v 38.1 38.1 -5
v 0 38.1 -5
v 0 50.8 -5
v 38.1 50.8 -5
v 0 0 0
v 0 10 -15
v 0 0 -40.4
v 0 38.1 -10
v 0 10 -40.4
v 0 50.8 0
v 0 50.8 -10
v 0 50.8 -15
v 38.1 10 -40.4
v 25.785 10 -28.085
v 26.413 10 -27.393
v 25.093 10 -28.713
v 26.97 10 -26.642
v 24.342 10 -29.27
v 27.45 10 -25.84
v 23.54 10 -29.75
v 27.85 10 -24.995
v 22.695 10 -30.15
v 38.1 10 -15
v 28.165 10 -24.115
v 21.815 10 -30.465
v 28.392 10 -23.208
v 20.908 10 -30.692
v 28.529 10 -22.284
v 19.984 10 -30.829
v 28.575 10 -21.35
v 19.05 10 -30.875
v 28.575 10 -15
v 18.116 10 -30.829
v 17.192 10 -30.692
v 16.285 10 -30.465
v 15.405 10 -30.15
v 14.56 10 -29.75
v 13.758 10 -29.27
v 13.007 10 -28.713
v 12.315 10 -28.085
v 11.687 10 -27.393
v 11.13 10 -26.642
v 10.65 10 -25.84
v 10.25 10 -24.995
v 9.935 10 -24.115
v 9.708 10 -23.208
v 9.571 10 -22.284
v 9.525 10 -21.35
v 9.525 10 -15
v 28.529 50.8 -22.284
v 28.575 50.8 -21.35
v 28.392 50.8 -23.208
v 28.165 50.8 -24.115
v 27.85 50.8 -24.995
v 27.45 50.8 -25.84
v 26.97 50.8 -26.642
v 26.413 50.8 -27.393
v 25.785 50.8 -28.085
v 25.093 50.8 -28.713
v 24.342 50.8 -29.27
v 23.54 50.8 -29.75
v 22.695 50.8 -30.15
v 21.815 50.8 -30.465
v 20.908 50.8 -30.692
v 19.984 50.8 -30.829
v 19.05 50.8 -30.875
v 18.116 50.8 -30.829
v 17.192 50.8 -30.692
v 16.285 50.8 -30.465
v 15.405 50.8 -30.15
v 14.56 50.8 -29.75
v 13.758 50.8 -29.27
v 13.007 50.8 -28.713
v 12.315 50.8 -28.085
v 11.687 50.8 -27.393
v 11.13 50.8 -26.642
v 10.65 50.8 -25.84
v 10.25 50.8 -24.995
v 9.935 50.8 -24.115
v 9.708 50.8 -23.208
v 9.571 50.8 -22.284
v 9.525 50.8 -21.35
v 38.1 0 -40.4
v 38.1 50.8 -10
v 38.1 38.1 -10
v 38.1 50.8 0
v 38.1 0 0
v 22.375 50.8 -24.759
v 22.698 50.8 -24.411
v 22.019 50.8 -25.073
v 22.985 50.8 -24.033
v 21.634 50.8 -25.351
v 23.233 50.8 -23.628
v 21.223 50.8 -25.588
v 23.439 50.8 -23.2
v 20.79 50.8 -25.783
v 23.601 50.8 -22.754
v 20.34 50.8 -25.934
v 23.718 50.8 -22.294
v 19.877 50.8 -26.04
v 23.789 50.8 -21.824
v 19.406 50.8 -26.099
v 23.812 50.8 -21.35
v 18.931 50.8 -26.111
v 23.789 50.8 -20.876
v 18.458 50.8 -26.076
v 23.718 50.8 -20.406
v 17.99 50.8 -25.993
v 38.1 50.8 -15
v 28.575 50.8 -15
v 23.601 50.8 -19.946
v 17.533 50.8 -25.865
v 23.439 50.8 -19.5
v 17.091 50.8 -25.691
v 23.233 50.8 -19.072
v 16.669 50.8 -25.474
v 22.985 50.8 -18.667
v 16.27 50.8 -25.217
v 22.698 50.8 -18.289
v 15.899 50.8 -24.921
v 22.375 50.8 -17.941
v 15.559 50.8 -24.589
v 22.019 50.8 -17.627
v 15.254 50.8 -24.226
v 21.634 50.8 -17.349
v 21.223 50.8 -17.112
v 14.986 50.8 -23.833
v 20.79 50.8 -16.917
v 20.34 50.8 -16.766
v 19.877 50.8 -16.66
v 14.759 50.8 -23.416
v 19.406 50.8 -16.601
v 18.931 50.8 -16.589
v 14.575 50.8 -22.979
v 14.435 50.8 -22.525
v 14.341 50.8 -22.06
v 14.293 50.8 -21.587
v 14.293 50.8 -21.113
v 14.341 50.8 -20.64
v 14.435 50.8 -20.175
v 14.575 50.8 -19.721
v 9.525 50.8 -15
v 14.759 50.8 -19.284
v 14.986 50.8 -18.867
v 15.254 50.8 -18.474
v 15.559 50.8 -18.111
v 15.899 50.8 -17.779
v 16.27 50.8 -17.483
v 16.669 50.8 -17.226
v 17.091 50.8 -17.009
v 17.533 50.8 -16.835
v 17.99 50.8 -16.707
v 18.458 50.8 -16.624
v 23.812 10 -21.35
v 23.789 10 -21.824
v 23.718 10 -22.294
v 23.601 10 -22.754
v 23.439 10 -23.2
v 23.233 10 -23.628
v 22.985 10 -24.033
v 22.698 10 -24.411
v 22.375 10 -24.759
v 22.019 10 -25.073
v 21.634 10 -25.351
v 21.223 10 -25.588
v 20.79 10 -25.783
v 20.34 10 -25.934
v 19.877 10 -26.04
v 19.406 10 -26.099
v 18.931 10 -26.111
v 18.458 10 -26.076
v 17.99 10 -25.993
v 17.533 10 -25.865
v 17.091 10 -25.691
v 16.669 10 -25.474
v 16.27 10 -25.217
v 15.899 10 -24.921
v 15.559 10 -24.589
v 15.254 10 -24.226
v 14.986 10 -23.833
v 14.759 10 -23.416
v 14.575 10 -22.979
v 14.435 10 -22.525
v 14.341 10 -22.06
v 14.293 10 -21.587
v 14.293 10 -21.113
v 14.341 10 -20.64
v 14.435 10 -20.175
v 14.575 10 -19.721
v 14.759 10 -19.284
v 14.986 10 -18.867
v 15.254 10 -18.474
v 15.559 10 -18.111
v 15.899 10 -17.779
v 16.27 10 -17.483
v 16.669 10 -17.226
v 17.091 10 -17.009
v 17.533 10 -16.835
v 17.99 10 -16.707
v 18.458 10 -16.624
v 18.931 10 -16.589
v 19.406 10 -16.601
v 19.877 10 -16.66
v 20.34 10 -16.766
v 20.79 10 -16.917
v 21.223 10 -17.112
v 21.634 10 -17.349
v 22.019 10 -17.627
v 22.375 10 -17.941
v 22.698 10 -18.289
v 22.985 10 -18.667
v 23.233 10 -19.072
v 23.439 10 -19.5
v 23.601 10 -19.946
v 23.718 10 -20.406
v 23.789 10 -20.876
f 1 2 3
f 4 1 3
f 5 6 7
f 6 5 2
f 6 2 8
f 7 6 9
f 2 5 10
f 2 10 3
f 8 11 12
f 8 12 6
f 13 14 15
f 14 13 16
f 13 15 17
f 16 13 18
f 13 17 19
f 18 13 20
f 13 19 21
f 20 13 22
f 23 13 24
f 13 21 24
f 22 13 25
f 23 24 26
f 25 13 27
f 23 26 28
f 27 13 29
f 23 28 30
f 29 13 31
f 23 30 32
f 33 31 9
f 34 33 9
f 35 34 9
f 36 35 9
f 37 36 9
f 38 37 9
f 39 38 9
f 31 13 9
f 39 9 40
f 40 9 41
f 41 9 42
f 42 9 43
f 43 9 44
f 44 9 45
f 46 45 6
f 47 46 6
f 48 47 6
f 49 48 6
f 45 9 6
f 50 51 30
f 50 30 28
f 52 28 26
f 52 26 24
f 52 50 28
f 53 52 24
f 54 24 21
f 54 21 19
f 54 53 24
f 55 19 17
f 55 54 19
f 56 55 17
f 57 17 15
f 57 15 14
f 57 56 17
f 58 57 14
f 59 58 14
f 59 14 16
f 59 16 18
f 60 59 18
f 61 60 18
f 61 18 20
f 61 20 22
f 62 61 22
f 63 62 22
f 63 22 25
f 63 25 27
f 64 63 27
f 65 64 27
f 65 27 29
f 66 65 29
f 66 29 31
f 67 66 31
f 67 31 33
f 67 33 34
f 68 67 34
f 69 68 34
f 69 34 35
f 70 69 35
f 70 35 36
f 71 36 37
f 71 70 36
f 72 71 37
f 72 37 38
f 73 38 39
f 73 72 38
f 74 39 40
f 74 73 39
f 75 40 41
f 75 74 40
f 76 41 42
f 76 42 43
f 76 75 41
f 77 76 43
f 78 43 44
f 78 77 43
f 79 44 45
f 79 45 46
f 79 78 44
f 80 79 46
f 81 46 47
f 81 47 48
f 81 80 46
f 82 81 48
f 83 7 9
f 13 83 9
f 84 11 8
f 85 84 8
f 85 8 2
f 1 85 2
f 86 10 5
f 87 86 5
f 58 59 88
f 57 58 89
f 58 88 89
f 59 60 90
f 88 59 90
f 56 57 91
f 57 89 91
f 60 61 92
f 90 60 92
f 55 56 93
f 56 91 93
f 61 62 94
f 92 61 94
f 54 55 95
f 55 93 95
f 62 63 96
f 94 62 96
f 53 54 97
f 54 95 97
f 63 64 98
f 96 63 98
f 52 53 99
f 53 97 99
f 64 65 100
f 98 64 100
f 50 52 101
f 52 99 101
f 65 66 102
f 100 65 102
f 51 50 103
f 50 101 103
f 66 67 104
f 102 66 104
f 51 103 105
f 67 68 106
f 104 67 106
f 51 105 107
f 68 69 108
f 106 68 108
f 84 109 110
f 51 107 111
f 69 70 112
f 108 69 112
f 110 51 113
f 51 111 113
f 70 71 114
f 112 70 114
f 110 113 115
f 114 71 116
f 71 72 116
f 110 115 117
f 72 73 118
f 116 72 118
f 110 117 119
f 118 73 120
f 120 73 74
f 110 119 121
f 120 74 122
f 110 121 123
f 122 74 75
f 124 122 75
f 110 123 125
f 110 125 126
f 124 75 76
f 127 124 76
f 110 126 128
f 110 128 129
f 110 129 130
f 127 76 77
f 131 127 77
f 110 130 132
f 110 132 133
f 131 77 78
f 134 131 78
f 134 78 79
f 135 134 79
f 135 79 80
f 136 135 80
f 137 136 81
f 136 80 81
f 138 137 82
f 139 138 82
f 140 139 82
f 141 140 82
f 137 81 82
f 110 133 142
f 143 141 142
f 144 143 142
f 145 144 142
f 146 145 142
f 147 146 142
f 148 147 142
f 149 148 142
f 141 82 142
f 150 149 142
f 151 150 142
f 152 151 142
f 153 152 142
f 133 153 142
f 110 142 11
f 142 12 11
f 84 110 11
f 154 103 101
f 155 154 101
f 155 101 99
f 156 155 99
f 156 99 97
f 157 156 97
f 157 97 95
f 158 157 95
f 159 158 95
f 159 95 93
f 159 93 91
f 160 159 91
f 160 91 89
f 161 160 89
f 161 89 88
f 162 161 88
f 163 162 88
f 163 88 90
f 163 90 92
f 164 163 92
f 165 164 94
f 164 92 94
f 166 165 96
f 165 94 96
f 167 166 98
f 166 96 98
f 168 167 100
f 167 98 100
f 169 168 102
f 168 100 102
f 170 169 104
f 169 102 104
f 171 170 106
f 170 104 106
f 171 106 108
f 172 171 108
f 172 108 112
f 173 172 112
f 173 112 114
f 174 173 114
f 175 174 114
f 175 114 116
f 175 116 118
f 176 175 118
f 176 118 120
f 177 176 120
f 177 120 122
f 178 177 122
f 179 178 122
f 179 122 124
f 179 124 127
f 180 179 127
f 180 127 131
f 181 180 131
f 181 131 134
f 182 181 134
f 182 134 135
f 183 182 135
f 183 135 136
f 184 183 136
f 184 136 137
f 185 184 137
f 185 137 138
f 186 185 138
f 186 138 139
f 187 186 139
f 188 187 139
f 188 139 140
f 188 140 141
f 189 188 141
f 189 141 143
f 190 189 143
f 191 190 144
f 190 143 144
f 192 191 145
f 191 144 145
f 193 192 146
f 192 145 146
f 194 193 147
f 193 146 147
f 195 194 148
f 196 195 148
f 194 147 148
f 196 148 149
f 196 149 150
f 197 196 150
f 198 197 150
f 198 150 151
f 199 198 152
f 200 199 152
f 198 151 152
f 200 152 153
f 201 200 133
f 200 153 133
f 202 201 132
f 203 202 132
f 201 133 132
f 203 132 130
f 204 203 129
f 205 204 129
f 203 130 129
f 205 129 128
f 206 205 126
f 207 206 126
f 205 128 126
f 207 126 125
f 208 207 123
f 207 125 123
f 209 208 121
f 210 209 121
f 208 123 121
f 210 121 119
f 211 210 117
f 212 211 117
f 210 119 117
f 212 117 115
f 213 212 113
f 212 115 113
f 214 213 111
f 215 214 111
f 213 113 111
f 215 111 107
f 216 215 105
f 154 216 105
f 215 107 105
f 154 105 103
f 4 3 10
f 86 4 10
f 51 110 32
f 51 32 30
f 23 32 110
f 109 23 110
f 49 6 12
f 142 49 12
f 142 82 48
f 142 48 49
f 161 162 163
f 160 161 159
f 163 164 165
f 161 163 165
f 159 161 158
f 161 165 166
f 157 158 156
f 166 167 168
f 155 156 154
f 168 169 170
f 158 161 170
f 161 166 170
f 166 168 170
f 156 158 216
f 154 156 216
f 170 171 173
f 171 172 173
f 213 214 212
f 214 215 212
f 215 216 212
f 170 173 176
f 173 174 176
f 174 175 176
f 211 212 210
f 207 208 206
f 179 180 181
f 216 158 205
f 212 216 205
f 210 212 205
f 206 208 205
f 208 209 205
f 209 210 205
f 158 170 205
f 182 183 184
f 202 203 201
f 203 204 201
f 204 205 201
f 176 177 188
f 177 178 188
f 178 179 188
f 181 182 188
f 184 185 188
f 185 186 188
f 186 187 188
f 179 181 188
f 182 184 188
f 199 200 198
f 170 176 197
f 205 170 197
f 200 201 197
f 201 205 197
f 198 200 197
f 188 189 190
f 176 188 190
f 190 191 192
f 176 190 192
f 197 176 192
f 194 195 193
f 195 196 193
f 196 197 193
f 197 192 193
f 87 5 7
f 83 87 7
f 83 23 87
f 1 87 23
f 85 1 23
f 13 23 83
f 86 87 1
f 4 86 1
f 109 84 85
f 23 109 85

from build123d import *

# Parameters (mm, degrees)
BOSS_EXTRUDE1_DEPTH = 38.1
BOSS_EXTRUDE2_REACH = 52.8
SKETCH2_R           = 4.7625


with BuildPart() as part:
    # Sketch1 → Boss-Extrude1 (new body)
    with BuildSketch(Plane(origin=(0, 0, 0), x_dir=(0, 0, -1), z_dir=(1, 0, 0))):
        Polygon((0, 0), (40.4, 0), (40.4, 10), (15, 10), (15, 50.8), (10, 50.8), (10, 38.1), (5, 38.1), (5, 50.8), (0, 50.8), align=None)
    extrude(amount=BOSS_EXTRUDE1_DEPTH)

    # Sketch2 → Boss-Extrude2 (add, up to next)
    with BuildSketch(Plane(origin=(0, 50.8, 0), x_dir=(1, 0, 0), z_dir=(0, 1, 0)), mode=Mode.PRIVATE) as boss_extrude2_sk1:
        with BuildLine():
            Line((9.525, 21.35), (9.525, 15))
            Line((9.525, 15), (28.575, 15))
            Line((28.575, 15), (28.575, 21.35))
            ThreePointArc((28.575, 21.35), (19.05, 30.875), (9.525, 21.35))
        make_face()
        with Locations((19.05, 21.35)):
            Circle(SKETCH2_R, mode=Mode.SUBTRACT)
    boss_extrude2_tool1 = extrude(boss_extrude2_sk1.sketch, amount=-BOSS_EXTRUDE2_REACH, mode=Mode.PRIVATE) - part.part
    add(boss_extrude2_tool1.solids().sort_by_distance((9.772975, 50.8, -18.175))[0])


solid = part.part
